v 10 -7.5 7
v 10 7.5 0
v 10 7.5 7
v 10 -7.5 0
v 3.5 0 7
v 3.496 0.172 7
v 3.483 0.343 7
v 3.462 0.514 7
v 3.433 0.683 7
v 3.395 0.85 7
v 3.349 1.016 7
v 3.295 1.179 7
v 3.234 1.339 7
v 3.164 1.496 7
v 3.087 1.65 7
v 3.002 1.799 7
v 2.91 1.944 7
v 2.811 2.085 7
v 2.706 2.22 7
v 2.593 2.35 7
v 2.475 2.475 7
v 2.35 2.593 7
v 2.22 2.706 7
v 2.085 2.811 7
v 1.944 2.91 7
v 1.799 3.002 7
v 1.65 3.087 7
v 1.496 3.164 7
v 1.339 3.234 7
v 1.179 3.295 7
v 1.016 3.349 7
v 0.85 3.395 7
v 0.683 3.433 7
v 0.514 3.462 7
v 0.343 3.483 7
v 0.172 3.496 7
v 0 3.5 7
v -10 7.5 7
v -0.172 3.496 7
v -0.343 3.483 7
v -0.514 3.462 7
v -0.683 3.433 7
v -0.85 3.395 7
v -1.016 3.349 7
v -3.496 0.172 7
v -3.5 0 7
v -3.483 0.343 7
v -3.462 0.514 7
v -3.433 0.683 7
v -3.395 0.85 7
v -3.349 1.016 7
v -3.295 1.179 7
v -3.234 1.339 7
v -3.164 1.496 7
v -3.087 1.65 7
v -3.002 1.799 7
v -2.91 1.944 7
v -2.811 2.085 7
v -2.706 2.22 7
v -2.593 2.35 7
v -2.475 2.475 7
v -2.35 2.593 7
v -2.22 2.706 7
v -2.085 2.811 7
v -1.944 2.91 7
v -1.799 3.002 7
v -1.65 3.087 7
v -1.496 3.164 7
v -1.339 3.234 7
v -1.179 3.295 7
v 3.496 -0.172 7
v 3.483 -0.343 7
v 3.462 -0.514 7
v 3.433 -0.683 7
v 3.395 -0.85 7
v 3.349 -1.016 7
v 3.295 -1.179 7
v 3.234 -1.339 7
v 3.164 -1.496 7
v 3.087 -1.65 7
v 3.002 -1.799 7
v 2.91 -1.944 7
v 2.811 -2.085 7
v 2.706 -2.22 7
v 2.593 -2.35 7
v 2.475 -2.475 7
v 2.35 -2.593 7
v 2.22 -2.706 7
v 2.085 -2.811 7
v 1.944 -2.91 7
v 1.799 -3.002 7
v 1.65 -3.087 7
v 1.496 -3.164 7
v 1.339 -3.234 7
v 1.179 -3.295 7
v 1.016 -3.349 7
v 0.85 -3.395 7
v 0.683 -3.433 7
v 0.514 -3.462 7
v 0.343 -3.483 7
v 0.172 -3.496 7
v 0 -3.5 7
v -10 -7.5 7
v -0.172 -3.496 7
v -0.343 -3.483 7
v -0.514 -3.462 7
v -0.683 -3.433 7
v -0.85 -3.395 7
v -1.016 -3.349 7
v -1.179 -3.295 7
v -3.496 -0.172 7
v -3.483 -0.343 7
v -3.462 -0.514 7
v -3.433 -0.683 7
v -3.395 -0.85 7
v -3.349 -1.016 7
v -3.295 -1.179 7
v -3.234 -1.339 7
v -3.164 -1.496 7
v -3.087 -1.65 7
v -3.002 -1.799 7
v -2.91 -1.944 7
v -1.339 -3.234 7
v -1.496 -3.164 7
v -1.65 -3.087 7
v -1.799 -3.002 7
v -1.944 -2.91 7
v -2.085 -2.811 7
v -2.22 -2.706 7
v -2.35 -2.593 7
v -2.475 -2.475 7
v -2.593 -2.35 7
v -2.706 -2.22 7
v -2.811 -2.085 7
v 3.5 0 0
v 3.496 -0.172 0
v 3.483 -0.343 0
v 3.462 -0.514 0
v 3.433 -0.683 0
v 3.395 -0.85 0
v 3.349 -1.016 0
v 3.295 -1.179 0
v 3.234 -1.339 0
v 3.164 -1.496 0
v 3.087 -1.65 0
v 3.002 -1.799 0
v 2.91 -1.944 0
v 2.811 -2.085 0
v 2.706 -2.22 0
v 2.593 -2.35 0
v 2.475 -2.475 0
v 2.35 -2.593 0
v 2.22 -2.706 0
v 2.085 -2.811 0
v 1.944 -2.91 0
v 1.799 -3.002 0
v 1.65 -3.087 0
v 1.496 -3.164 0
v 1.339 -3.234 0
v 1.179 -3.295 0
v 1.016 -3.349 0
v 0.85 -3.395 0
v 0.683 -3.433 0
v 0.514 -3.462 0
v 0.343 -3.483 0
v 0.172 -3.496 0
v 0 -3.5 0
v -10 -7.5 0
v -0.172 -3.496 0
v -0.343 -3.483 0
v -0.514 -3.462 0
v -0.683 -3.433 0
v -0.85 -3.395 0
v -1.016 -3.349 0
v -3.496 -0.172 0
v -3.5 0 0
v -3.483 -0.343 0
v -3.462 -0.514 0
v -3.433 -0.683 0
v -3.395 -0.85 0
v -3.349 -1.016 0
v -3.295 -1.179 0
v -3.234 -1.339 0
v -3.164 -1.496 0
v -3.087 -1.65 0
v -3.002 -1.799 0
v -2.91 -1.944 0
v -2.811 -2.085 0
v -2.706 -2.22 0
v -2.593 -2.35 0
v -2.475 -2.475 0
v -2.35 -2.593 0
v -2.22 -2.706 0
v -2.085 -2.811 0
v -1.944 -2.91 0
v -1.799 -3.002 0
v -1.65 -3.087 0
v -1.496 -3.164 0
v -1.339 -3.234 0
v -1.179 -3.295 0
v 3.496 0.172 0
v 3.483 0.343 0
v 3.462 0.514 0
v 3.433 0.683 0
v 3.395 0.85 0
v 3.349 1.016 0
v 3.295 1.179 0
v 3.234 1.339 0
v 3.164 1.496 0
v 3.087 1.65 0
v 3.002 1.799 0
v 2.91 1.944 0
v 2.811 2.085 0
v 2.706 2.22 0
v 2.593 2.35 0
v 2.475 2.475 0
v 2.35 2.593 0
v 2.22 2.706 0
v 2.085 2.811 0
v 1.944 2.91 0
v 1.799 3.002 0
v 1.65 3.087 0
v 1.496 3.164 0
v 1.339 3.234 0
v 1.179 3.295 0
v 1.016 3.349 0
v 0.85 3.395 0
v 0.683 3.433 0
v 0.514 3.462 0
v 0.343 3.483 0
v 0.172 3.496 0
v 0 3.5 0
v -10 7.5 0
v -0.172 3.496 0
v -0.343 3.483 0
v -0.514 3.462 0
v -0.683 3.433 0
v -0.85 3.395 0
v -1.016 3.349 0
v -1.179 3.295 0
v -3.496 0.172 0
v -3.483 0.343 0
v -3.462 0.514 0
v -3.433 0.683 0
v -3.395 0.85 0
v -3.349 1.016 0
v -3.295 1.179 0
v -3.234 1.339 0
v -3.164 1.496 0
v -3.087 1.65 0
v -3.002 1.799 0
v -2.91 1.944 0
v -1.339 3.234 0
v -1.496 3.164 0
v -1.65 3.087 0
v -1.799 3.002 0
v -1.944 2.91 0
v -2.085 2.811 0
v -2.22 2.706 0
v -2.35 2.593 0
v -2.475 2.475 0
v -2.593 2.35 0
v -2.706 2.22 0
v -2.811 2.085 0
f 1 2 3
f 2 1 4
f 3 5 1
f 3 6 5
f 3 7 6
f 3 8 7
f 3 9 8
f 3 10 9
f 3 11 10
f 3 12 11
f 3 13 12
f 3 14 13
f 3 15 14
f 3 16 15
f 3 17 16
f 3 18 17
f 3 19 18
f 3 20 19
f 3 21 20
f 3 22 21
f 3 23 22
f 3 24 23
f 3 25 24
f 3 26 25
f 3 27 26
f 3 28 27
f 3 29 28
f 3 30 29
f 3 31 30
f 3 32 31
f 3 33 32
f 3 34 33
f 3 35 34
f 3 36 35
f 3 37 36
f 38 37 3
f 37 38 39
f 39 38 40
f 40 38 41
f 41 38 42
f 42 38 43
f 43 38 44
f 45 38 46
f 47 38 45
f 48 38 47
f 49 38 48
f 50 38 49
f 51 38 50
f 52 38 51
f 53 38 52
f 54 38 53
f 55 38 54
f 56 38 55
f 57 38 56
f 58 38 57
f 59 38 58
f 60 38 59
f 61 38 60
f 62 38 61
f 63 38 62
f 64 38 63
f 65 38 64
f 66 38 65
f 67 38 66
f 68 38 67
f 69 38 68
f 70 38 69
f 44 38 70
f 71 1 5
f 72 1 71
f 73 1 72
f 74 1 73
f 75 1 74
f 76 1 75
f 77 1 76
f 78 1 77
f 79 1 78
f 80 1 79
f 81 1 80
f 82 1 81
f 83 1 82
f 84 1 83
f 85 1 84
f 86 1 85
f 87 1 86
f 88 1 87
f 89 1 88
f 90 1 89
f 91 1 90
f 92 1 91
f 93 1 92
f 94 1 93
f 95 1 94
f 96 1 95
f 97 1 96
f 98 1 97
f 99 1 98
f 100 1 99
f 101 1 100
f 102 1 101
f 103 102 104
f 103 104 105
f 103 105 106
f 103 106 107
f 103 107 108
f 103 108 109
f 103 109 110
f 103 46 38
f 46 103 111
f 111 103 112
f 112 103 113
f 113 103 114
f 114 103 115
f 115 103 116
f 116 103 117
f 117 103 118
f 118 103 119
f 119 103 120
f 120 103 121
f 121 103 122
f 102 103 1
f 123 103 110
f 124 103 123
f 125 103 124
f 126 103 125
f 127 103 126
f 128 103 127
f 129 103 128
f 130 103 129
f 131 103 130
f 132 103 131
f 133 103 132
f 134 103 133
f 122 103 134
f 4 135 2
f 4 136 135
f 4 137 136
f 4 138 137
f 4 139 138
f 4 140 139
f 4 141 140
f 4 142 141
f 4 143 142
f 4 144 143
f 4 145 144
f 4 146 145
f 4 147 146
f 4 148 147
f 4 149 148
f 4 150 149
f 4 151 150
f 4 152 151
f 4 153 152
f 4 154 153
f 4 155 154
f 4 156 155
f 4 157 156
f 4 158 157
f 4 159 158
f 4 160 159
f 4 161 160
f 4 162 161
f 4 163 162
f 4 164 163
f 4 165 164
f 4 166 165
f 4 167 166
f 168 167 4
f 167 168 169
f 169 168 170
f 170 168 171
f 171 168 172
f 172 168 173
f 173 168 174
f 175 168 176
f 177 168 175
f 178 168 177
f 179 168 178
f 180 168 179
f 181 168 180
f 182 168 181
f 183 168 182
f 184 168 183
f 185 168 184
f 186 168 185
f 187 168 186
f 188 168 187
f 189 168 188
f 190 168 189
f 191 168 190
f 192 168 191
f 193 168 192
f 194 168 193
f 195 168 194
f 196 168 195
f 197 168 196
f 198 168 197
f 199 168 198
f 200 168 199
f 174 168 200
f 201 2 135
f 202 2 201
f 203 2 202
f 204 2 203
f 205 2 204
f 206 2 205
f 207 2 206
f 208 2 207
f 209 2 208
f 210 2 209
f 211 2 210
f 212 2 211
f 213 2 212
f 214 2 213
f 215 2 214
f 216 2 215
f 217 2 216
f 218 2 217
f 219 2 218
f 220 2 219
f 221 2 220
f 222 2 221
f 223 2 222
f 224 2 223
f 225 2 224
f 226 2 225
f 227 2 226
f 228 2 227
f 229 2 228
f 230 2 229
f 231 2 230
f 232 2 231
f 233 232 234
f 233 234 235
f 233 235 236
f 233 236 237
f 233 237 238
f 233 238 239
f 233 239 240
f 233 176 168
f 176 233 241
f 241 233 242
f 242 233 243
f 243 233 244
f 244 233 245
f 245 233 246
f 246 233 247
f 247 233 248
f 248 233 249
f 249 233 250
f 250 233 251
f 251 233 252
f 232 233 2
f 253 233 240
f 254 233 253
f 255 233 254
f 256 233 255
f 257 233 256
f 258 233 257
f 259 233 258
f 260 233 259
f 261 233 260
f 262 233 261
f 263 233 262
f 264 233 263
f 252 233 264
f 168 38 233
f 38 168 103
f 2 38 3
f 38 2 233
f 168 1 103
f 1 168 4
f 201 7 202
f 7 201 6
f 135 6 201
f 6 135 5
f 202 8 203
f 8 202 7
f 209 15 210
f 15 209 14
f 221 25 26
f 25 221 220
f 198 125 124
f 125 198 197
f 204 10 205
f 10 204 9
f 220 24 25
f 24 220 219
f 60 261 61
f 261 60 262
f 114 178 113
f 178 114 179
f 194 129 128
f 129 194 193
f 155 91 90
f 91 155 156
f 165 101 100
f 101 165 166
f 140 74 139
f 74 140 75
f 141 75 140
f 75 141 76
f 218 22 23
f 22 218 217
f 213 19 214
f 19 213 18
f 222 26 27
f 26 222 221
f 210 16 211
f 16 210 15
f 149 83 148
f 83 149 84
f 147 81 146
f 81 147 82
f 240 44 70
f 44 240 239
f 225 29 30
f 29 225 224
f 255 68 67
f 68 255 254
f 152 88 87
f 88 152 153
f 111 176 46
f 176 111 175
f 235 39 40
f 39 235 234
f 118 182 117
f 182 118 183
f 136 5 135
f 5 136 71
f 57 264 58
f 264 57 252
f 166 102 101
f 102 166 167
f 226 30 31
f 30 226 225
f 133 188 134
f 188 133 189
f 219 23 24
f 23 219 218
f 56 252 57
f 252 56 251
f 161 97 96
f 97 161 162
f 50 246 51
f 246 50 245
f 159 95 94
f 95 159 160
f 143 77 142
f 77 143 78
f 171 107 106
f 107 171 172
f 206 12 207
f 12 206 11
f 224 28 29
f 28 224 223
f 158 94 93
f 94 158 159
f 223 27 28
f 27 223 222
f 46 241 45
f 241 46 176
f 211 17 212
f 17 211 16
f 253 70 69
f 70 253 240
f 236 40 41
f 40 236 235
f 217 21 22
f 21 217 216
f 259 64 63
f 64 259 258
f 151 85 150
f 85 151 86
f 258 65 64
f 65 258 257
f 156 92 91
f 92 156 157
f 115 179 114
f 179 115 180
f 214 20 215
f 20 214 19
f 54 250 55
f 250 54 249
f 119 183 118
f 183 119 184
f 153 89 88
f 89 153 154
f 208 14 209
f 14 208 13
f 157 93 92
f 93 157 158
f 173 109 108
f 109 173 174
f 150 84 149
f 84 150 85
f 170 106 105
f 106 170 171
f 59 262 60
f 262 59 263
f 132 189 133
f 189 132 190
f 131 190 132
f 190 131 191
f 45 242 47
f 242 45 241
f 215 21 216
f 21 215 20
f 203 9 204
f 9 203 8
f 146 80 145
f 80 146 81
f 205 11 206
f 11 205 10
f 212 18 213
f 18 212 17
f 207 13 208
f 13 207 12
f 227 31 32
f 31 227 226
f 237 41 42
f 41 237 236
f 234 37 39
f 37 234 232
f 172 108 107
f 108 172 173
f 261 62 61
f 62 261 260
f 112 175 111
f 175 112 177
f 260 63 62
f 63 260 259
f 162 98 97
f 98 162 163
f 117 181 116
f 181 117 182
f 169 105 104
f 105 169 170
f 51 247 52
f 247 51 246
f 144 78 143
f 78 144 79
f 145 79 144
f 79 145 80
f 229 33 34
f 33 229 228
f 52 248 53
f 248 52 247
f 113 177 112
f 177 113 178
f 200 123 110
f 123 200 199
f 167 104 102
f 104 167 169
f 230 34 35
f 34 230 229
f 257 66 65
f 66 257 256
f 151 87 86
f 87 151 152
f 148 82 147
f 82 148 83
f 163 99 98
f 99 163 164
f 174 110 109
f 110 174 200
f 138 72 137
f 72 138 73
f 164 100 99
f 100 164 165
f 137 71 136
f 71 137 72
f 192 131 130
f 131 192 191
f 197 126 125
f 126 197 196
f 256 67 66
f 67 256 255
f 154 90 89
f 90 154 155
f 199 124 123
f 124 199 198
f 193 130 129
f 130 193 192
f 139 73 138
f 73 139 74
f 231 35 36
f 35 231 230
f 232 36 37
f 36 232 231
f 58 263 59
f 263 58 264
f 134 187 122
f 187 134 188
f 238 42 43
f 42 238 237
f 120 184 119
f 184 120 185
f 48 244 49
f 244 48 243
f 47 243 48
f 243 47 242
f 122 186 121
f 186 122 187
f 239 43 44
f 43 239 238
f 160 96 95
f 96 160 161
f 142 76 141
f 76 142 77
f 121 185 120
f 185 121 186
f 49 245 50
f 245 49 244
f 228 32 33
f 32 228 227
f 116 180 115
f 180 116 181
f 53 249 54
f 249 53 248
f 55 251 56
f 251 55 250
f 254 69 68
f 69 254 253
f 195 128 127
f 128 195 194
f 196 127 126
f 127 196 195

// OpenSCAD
l = 20;
w =15;
h = 7;
diameter = 7;
eps = 0.01;
faces = 128;

module well(){
    difference(){
        translate([-l/2,-w/2,0]) 
            cube([l,w,h]);
        
        translate([0,0,-eps])
            cylinder(h+eps*2,d=diameter,$fn=faces);
    }
}

color("blue", alpha=0.25) well();
